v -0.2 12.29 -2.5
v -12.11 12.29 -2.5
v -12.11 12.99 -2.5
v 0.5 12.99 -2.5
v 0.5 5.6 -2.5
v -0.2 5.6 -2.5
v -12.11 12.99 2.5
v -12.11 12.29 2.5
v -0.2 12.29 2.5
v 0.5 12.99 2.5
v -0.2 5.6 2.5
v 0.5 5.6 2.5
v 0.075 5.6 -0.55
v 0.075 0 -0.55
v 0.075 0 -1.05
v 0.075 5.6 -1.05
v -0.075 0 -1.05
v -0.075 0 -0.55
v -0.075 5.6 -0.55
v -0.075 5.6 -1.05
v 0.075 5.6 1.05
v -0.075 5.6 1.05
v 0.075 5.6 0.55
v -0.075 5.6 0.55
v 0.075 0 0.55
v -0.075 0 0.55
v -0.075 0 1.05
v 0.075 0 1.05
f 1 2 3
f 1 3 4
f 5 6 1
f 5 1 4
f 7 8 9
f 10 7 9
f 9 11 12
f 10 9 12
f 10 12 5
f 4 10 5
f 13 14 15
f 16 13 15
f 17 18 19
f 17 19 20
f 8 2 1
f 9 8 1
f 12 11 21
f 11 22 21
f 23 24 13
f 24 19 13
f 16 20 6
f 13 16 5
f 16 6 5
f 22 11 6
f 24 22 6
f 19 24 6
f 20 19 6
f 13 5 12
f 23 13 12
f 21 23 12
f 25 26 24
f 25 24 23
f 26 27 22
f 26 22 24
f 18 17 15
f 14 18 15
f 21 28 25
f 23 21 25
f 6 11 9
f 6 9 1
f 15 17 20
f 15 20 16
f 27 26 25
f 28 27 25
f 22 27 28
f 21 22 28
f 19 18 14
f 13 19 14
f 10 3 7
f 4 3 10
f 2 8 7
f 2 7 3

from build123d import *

# Parameters (mm, degrees)
SKETCH1_W                    = 0.15
SKETCH1_H                    = 0.5
LEGS_DEPTH                   = 6.1
LEGS_2_DEPTH                 = 6.1
FILM_START                   = 5.6
SKETCH2_W                    = 0.7
SKETCH2_H                    = 5
FILM_UP_THE_CELL_SIDE_DEPTH  = 7.39
FILM_START_2                 = 12.29
SKETCH3_W                    = 11.91
SKETCH3_H                    = 5
FILM_BETWEEN_THE_CELLS_DEPTH = 0.7


with BuildPart() as part:
    # Sketch1 → Legs (new body)
    with BuildSketch(Plane(origin=(0, 0, 0), x_dir=(1, 0, 0), z_dir=(0, 1, 0))):
        with Locations((0, 0.8)):
            Rectangle(SKETCH1_W, SKETCH1_H)
    extrude(amount=LEGS_DEPTH)



with BuildPart() as body_2:
    # Sketch1 → Legs 2 (new body)
    with BuildSketch(Plane(origin=(0, 0, 0), x_dir=(1, 0, 0), z_dir=(0, 1, 0))):
        with Locations((0, -0.8)):
            Rectangle(SKETCH1_W, SKETCH1_H)
    extrude(amount=LEGS_2_DEPTH)


with BuildPart() as part_1:
    add(part.part)

    add(body_2.part)  # Film up the cell side merges body 2
    # Sketch2 → Film up the cell side (add)
    with BuildSketch(Plane(origin=(0, 0, 0), x_dir=(1, 0, 0), z_dir=(0, 1, 0)).offset(FILM_START)):
        with Locations((0.15, 0)):
            Rectangle(SKETCH2_W, SKETCH2_H)
    extrude(amount=FILM_UP_THE_CELL_SIDE_DEPTH)

    # Sketch3 → Film between the cells (add)
    with BuildSketch(Plane(origin=(0, 0, 0), x_dir=(1, 0, 0), z_dir=(0, 1, 0)).offset(FILM_START_2)):
        with Locations((-6.155, 0)):
            Rectangle(SKETCH3_W, SKETCH3_H)
    extrude(amount=FILM_BETWEEN_THE_CELLS_DEPTH)


solid = part_1.part
